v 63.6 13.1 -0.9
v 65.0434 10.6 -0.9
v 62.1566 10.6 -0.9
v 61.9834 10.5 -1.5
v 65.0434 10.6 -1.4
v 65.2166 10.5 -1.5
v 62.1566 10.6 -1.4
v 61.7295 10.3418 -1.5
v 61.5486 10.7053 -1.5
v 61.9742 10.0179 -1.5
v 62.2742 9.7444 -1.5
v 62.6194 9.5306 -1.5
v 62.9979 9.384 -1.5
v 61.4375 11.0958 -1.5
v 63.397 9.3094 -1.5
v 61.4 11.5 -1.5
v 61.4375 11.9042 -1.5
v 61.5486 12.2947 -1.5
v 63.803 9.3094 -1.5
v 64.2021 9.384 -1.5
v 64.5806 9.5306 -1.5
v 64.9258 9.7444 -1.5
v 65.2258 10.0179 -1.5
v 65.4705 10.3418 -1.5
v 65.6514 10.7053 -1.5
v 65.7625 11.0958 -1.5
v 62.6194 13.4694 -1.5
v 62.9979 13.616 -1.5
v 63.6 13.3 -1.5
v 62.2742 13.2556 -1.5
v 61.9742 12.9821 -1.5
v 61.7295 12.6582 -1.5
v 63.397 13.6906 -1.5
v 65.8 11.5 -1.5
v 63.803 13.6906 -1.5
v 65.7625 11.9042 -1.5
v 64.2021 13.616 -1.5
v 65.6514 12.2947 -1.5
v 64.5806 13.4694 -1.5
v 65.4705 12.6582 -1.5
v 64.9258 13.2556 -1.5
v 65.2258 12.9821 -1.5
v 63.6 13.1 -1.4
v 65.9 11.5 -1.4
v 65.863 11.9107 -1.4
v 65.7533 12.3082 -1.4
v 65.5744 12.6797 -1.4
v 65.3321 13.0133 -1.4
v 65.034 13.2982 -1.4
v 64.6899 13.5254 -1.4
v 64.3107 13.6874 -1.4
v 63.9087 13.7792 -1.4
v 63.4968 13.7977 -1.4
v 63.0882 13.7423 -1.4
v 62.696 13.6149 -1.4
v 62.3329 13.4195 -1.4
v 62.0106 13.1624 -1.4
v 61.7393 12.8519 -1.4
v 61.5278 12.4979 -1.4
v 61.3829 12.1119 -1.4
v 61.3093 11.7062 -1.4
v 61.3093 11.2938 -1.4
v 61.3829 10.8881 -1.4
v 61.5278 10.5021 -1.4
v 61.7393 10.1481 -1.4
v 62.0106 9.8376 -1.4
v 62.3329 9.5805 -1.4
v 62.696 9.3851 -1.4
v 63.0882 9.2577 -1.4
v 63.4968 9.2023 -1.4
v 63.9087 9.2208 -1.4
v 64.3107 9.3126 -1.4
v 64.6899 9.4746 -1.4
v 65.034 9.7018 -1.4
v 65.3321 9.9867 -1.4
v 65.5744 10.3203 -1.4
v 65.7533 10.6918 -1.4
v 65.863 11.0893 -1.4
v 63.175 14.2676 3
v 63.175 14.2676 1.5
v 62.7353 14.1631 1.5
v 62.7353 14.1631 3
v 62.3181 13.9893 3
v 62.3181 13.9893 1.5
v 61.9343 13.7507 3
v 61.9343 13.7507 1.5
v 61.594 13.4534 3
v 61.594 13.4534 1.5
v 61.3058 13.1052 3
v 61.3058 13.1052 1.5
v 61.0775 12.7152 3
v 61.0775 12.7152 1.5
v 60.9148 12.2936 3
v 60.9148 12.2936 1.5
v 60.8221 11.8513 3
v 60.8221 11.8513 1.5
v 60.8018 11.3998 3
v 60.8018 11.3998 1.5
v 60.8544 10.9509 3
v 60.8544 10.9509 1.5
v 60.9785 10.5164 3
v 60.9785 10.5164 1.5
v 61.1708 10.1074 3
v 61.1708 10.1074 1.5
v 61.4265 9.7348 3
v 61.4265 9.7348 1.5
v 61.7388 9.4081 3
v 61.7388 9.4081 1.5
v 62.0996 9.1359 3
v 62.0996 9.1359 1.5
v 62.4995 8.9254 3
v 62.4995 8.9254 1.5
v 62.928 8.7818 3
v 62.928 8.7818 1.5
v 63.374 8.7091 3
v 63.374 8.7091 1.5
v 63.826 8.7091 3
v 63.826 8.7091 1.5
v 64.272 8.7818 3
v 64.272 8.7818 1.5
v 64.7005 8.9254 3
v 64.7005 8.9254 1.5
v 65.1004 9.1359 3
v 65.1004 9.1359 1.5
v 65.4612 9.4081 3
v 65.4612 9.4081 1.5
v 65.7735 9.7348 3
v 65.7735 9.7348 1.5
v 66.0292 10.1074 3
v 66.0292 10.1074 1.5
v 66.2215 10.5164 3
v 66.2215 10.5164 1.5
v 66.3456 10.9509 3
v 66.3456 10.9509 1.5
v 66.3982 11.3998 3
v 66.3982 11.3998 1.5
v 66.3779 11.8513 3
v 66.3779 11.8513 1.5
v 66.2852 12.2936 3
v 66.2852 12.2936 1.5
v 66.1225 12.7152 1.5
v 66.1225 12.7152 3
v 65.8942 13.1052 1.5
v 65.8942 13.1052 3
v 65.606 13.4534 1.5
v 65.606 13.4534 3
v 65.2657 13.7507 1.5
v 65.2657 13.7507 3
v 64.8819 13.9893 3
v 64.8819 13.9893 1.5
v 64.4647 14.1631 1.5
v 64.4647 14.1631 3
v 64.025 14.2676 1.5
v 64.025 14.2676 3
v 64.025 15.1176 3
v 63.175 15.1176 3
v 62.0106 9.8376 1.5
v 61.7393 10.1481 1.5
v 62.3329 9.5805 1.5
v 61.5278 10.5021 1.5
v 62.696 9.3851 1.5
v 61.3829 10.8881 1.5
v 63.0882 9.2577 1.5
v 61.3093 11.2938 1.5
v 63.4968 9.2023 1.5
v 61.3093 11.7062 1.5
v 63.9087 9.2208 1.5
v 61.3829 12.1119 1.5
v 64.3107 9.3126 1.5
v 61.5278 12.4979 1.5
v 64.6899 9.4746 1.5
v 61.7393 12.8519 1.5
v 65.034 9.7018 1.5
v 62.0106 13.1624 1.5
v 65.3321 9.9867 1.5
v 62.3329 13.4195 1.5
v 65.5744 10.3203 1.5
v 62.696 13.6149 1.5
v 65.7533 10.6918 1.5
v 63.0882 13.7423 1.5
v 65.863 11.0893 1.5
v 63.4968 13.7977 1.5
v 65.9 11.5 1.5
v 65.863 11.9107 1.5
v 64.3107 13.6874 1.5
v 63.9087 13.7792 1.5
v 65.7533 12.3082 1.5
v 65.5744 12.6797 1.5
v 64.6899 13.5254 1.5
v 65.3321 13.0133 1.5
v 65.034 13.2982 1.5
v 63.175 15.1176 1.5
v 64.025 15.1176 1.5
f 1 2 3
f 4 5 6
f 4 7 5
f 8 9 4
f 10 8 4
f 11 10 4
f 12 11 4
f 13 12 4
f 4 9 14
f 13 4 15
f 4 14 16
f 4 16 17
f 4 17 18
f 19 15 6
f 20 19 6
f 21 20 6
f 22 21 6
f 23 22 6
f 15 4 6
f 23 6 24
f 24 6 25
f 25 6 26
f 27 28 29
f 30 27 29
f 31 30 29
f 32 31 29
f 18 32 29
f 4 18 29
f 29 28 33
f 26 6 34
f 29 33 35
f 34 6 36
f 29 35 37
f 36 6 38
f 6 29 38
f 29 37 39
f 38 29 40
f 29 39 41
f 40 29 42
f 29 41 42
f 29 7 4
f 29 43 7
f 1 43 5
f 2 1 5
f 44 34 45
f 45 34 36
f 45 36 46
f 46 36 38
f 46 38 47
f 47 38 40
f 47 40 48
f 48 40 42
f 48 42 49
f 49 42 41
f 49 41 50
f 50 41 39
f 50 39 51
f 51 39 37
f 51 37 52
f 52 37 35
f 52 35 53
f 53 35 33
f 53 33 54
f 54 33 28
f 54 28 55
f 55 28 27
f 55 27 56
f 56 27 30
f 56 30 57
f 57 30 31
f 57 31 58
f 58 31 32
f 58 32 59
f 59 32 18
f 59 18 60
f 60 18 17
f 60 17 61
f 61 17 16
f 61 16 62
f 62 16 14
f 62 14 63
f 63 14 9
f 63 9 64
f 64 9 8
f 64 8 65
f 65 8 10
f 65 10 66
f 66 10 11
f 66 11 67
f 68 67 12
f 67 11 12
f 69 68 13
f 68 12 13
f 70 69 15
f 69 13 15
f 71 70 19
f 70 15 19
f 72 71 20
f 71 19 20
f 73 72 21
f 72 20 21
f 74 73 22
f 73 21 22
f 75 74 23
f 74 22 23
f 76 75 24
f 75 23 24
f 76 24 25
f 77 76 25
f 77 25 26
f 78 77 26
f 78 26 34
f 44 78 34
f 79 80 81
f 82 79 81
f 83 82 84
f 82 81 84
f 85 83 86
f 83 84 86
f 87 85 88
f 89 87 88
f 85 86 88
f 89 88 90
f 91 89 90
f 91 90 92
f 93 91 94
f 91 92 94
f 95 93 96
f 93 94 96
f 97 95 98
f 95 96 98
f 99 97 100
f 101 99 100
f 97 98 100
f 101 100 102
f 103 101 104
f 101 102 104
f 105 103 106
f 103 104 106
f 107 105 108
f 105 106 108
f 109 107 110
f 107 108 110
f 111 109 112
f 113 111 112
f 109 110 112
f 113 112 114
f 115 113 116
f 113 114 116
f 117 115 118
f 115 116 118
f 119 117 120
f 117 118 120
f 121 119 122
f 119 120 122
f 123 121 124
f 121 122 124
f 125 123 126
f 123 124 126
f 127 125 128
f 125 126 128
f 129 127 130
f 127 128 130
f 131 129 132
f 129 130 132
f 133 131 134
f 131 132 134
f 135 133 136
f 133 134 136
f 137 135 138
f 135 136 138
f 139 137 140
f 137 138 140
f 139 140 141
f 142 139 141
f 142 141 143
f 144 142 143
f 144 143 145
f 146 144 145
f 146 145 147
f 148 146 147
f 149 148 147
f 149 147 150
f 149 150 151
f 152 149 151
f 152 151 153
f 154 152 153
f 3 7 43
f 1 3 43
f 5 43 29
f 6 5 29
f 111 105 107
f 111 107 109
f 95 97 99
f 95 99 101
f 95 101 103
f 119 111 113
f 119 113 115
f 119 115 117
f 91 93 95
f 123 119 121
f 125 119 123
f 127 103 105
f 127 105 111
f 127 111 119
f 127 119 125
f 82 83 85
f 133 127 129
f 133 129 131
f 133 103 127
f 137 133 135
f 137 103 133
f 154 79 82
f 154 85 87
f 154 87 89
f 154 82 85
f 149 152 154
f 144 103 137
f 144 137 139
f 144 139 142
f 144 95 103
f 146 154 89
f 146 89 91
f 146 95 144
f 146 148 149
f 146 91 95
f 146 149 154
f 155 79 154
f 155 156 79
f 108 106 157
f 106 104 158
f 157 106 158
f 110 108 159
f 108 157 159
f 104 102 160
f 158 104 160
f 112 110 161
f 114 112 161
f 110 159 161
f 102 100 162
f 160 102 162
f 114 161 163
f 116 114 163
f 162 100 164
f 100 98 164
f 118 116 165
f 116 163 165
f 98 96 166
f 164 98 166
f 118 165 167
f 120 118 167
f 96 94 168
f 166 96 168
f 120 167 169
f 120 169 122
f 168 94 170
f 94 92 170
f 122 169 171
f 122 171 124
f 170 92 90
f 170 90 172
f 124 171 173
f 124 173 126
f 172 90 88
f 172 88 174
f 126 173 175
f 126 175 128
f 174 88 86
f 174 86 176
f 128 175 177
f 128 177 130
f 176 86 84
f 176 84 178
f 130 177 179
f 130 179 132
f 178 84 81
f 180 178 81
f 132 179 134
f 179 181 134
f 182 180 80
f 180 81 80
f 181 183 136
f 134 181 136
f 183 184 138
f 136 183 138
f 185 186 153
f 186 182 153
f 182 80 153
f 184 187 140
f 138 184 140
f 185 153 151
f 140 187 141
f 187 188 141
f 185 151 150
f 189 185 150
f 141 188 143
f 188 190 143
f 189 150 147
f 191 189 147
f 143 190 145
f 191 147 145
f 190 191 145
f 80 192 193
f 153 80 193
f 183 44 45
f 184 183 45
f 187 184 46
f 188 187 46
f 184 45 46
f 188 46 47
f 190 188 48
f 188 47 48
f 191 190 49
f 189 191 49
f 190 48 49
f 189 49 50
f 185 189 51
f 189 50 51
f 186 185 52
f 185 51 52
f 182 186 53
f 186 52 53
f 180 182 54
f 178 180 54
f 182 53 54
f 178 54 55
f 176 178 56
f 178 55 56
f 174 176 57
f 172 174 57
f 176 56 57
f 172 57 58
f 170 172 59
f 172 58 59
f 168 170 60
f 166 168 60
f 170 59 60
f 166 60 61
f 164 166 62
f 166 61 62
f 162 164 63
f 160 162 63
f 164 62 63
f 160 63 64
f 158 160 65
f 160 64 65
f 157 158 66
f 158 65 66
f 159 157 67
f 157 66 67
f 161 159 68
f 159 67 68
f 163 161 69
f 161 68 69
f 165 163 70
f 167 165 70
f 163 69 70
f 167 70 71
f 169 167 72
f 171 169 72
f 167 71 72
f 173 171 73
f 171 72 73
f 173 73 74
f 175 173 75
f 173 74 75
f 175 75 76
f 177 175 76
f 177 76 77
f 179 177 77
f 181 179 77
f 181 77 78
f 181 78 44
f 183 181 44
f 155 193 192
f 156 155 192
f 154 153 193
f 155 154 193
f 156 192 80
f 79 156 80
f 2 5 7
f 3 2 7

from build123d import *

# Parameters (mm, degrees)
SKETCH043_R     = 2.3
PAD030_DEPTH    = 3
PAD031_DEPTH    = 1.5
POCKET006_DEPTH = 0.6
CHAMFER_SIZE    = 0.1


with BuildPart() as part:
    # Sketch043 → Pad030 (new body)
    with BuildSketch(Plane.XY):
        Circle(SKETCH043_R)
    extrude(amount=PAD030_DEPTH)

    # Sketch044 (on Face3 of Pad030) → Pad031 (join)
    with BuildSketch(Plane.XY.offset(3)):
        with BuildLine():
            Line((0.425, 2.767558), (0.425, 3.617558))
            Line((0.425, 3.617558), (-0.425, 3.617558))
            Line((-0.425, 3.617558), (-0.425, 2.767558))
            ThreePointArc((-0.425, 2.767558), (0, -2.8), (0.425, 2.767558))
        make_face()
    extrude(amount=PAD031_DEPTH)

    # Sketch045 → Pocket006 (cut)
    with BuildSketch(Plane.XY):
        Polygon((-1.443376, -0.9), (0, 1.6), (1.443376, -0.9), align=None)
    extrude(amount=POCKET006_DEPTH, mode=Mode.SUBTRACT)

    # Chamfer
    chamfer_edges = [part.edges().sort_by_distance(p)[0] for p in [
        (-0.721688, 0.35, 0),
        (0, -0.9, 0),
        (0.721688, 0.35, 0),
        (-2.3, 0, 0),
    ]]
    chamfer(chamfer_edges, length=CHAMFER_SIZE)


with BuildPart() as part_1:
    # Body012 placement: moved
    add(part.part.moved(Location((63.6, 11.5, -1.5))))


solid = part_1.part
